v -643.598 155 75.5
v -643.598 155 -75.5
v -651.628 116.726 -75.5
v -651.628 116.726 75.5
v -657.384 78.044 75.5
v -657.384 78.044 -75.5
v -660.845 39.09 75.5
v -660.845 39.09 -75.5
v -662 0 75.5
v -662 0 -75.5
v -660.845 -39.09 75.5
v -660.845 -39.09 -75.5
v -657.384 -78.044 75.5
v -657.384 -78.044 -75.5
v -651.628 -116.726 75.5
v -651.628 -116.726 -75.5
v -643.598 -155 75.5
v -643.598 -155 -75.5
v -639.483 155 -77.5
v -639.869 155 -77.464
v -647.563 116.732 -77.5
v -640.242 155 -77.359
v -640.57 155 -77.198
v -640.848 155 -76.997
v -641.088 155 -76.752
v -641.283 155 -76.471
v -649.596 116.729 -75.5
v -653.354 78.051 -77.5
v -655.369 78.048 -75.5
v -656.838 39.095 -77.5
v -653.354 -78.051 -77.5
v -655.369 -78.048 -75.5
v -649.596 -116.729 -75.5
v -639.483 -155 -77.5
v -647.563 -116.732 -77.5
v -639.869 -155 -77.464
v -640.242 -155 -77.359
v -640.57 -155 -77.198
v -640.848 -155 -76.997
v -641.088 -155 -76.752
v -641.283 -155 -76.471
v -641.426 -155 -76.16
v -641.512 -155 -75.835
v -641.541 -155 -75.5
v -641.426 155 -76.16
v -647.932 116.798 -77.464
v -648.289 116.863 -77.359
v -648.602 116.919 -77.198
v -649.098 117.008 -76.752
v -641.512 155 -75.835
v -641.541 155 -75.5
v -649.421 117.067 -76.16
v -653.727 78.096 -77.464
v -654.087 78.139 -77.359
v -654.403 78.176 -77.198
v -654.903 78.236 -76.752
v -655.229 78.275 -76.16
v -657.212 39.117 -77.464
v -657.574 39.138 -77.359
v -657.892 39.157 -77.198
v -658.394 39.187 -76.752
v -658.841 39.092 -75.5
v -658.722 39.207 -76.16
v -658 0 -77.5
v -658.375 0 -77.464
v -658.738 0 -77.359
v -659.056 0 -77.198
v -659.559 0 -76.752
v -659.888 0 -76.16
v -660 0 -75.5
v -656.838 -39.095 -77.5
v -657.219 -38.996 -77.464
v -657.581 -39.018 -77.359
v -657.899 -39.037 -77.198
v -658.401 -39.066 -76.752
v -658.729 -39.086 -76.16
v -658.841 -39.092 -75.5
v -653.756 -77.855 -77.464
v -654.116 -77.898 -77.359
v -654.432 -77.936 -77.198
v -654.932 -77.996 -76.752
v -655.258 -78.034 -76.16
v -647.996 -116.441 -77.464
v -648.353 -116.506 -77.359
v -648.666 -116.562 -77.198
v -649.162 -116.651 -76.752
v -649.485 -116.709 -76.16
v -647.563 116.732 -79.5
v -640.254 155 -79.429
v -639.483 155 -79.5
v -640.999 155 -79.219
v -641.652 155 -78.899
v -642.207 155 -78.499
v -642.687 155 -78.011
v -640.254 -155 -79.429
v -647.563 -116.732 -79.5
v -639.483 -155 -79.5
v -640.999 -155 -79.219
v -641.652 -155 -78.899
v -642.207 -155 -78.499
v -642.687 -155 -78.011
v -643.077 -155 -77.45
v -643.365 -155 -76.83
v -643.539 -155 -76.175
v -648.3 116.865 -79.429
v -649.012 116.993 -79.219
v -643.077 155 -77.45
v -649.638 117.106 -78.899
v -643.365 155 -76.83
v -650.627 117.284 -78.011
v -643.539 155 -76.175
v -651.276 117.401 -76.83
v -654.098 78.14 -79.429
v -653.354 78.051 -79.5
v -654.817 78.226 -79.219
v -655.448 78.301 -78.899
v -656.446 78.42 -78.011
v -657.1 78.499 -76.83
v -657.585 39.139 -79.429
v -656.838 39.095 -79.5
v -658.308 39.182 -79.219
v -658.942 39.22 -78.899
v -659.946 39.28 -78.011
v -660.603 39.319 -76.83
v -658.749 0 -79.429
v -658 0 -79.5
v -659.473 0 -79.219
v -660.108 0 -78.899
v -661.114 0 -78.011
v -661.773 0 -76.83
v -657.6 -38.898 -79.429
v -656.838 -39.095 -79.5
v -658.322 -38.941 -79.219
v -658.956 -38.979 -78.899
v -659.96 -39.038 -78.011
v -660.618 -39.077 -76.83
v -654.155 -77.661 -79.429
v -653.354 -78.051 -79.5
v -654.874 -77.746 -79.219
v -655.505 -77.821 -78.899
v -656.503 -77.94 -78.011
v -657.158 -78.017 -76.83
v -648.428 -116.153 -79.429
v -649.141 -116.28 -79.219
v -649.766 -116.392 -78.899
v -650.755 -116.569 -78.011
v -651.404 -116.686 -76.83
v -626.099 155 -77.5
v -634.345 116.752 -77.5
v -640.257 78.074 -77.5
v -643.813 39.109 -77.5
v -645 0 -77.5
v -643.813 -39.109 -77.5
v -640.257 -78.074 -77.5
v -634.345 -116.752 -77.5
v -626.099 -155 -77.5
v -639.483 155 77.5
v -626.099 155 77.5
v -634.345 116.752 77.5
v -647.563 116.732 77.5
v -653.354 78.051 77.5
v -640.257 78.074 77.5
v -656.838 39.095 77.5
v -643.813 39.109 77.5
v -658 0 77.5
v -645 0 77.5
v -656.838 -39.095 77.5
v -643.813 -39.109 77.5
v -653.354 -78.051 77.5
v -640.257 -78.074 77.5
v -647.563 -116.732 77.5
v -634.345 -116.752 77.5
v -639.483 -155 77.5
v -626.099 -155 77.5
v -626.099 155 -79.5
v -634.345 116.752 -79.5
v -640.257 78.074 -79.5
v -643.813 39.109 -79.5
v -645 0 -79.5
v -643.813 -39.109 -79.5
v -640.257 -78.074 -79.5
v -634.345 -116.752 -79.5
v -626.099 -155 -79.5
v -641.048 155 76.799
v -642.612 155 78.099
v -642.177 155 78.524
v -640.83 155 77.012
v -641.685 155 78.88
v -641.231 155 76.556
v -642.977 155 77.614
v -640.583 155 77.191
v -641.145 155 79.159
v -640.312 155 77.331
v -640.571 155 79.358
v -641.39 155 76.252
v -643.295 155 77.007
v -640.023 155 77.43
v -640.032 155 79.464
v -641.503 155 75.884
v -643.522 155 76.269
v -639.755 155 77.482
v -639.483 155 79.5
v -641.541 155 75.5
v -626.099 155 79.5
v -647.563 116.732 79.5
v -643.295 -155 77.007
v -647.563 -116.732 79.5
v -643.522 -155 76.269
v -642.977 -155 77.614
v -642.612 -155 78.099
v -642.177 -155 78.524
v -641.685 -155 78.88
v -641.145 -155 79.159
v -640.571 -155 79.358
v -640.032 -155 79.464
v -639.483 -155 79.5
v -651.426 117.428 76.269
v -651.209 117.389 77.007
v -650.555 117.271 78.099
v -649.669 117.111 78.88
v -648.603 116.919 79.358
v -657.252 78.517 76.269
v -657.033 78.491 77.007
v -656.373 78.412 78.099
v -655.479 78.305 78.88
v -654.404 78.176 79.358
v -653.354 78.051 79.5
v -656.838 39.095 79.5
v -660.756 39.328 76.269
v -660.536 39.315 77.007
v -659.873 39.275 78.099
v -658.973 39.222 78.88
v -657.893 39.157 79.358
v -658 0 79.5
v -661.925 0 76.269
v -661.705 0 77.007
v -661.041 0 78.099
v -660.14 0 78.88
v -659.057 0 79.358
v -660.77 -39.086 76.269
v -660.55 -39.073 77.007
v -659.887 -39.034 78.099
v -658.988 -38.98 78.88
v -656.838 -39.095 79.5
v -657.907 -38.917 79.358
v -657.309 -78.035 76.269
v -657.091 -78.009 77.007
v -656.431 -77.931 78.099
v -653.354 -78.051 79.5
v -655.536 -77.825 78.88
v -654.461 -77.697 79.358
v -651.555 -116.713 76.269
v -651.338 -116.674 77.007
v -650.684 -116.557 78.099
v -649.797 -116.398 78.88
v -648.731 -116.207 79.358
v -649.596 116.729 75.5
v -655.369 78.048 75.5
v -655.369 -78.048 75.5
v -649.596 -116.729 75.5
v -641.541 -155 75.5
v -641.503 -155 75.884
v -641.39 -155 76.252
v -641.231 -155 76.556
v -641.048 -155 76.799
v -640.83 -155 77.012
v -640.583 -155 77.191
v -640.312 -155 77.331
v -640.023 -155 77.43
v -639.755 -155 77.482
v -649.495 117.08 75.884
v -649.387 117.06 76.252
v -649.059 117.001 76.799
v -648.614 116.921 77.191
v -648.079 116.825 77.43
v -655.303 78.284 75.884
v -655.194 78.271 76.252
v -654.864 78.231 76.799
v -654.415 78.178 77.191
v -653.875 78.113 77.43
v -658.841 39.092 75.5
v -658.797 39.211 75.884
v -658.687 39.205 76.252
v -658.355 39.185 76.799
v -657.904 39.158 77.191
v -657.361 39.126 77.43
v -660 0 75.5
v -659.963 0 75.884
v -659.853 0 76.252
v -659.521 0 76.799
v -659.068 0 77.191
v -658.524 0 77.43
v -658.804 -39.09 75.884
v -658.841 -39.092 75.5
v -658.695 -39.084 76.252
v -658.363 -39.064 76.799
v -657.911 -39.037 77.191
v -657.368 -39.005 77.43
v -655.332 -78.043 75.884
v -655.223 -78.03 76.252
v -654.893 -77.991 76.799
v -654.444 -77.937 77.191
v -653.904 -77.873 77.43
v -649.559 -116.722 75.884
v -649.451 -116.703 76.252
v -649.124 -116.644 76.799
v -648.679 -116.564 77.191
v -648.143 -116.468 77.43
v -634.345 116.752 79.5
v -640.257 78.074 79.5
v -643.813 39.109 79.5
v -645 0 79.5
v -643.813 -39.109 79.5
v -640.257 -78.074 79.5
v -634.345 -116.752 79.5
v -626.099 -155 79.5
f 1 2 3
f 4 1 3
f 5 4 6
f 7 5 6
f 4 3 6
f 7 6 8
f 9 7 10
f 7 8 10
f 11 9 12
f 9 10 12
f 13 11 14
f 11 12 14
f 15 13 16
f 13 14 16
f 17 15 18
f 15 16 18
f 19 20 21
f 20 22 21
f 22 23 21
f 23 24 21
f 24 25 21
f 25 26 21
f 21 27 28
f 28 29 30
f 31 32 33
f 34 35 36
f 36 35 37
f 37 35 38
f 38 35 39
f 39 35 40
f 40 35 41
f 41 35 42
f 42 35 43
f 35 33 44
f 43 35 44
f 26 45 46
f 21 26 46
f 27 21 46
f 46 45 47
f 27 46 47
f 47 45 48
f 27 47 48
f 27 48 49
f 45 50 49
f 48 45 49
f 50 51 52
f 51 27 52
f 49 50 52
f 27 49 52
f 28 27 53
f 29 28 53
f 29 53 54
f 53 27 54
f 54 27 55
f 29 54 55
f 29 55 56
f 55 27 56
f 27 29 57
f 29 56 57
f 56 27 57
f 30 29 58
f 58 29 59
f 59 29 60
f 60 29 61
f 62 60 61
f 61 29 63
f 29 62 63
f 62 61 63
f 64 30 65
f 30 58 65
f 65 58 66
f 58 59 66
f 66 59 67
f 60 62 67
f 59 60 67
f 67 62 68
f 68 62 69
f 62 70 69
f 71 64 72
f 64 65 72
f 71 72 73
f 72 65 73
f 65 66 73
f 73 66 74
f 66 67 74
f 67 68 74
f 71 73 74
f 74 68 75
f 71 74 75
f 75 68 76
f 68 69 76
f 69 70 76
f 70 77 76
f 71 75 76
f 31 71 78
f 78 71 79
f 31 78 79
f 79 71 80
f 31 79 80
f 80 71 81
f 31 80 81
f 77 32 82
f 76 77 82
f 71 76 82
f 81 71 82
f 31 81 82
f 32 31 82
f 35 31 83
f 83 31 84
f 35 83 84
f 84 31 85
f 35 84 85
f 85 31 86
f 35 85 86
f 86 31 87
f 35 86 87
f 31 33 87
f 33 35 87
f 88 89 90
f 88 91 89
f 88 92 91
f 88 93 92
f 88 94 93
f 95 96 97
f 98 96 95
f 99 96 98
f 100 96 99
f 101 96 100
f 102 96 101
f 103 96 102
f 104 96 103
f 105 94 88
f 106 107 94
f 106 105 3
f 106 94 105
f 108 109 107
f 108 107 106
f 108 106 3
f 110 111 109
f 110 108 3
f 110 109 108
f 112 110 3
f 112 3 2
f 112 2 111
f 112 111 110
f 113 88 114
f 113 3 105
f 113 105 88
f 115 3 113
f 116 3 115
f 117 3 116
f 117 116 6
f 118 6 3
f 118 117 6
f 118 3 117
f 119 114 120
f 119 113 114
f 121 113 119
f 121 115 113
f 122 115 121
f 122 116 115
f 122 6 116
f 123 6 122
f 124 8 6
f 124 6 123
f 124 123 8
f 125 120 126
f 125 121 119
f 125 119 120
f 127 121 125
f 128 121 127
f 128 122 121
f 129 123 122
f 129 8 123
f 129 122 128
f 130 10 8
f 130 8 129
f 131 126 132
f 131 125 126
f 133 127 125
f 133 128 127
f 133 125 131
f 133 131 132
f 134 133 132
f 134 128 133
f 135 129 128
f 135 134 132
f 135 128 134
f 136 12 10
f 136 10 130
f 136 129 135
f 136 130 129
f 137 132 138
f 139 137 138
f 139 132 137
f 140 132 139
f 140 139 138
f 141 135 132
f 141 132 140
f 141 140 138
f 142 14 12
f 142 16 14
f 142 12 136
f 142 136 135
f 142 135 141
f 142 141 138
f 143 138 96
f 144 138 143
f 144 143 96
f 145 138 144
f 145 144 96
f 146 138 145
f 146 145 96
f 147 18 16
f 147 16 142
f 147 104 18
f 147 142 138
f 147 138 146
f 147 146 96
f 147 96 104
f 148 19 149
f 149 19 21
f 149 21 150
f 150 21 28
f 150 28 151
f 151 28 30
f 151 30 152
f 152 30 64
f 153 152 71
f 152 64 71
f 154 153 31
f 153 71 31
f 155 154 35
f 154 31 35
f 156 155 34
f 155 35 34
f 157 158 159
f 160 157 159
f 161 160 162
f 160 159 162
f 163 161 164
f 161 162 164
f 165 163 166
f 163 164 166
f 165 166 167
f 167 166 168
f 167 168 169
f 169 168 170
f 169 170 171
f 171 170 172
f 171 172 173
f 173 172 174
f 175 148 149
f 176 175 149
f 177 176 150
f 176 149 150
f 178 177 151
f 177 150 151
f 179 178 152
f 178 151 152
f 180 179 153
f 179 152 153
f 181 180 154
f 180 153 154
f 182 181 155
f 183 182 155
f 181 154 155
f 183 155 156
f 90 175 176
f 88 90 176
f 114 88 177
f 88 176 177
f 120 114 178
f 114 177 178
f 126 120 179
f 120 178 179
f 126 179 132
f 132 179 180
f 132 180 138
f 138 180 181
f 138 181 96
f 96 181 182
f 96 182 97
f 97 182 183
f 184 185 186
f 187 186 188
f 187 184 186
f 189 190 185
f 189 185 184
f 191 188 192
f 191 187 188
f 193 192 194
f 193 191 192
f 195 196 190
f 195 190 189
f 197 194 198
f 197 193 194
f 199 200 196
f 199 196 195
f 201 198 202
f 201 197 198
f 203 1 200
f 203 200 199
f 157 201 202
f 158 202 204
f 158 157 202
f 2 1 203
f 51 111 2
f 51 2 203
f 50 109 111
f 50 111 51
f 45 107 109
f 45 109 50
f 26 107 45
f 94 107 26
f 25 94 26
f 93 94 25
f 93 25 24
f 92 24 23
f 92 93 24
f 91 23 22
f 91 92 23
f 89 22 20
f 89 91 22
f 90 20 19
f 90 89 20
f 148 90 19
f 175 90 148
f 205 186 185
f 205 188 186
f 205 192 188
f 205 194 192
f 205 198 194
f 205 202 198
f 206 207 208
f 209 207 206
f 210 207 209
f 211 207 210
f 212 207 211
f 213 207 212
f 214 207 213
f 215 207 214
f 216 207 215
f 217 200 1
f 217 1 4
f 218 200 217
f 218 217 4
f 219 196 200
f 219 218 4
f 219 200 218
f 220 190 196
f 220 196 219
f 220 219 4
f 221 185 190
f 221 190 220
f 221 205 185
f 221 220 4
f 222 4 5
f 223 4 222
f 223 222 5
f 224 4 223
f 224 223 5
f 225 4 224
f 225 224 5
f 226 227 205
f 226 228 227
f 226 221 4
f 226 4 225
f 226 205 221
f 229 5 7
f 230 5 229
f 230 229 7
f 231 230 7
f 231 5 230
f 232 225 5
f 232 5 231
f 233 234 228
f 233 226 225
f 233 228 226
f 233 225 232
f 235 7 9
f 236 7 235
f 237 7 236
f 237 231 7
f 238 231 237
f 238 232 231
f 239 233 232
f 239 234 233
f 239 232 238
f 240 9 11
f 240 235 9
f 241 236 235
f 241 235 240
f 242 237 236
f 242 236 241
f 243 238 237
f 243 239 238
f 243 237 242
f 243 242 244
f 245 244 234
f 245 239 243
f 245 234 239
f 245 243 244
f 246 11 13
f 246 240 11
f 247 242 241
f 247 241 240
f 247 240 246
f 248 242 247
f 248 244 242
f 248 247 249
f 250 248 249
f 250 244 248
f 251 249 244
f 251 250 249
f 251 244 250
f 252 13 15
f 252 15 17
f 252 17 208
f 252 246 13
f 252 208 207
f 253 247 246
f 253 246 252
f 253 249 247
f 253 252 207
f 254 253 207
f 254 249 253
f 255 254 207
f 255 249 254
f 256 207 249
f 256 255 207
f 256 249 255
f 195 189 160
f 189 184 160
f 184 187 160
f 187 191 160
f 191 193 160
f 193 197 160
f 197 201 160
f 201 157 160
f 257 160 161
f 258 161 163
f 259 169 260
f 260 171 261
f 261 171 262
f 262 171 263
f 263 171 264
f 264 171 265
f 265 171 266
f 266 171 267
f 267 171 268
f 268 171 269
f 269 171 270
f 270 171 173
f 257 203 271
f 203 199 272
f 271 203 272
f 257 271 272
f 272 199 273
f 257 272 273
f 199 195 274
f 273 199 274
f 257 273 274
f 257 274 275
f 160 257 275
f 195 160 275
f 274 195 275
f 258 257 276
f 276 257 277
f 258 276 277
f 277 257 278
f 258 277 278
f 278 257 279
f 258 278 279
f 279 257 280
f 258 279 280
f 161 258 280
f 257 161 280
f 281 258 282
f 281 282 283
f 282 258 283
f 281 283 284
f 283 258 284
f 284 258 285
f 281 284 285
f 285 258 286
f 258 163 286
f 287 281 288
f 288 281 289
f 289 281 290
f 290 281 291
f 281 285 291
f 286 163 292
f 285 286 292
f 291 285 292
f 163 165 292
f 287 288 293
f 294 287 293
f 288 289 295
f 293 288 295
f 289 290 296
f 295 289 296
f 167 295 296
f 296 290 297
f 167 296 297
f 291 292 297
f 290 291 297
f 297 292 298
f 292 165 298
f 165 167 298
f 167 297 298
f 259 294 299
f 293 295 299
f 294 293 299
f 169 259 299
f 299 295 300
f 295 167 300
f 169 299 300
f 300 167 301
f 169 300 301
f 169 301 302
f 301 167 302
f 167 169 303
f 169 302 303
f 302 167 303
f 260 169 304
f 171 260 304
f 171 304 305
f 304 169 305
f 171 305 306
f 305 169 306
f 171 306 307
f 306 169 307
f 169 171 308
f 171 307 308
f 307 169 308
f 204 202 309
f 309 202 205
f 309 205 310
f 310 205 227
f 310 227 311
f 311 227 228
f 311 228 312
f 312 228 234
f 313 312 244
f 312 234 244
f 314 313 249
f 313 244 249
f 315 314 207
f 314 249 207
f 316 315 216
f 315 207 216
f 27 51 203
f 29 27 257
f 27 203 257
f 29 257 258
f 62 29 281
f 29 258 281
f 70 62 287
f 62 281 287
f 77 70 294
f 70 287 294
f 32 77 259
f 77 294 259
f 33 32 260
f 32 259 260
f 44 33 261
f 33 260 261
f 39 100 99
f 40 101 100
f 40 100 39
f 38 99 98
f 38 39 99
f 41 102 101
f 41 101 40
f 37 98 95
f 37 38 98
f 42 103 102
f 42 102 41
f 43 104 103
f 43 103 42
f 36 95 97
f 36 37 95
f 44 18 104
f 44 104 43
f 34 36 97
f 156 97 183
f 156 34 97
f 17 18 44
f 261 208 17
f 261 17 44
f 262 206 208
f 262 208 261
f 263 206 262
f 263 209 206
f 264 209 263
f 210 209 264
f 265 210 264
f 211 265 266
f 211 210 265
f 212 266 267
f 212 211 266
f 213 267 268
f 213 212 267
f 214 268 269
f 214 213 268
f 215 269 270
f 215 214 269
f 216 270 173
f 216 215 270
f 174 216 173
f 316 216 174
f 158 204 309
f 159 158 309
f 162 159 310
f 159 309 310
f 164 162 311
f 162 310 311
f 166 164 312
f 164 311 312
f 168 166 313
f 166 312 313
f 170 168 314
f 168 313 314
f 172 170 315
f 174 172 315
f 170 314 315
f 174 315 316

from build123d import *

# Parameters (mm, degrees)
F3_W     = 310
F3_H     = 1324
F4_DEPTH = 100
F5_W     = 1324
F5_H     = 488.598477
F6_DEPTH = 100


with BuildPart() as f2:
    # F2: sweep along a path in F1
    with BuildLine(Plane.XY) as f2_path:
        ThreePointArc((0, 660), (-660, 0), (0, -660))
    # F0 (on Right) → F2 (sweep)
    with BuildSketch(Plane.YZ):
        with BuildLine():
            Line((-658, 77.5), (-645, 77.5))
            Line((-645, 77.5), (-645, 79.5))
            Line((-645, 79.5), (-658, 79.5))
            ThreePointArc((-658, 79.5), (-660.828427, 78.328427), (-662, 75.5))
            Line((-662, 75.5), (-662, -75.5))
            ThreePointArc((-662, -75.5), (-660.828427, -78.328427), (-658, -79.5))
            Line((-658, -79.5), (-645, -79.5))
            Line((-645, -79.5), (-645, -77.5))
            Line((-645, -77.5), (-658, -77.5))
            ThreePointArc((-658, -77.5), (-659.414214, -76.914214), (-660, -75.5))
            Line((-660, -75.5), (-660, 75.5))
            ThreePointArc((-660, 75.5), (-659.414214, 76.914214), (-658, 77.5))
        make_face()
    sweep(path=f2_path.line)

    # F3 (on Top) → F4 (cut, symmetric)
    with BuildSketch(Plane.XY):
        Rectangle(F3_W, F3_H)
    extrude(amount=F4_DEPTH, both=True, mode=Mode.SUBTRACT)

    # F5 (on Top) → F6 (cut, symmetric)
    with BuildSketch(Plane.XY):
        with Locations((0, 399.299239)):
            Rectangle(F5_W, F5_H)
        with Locations((0, -399.299239)):
            Rectangle(F5_W, F5_H)
    extrude(amount=F6_DEPTH, both=True, mode=Mode.SUBTRACT)


solid = f2.part
